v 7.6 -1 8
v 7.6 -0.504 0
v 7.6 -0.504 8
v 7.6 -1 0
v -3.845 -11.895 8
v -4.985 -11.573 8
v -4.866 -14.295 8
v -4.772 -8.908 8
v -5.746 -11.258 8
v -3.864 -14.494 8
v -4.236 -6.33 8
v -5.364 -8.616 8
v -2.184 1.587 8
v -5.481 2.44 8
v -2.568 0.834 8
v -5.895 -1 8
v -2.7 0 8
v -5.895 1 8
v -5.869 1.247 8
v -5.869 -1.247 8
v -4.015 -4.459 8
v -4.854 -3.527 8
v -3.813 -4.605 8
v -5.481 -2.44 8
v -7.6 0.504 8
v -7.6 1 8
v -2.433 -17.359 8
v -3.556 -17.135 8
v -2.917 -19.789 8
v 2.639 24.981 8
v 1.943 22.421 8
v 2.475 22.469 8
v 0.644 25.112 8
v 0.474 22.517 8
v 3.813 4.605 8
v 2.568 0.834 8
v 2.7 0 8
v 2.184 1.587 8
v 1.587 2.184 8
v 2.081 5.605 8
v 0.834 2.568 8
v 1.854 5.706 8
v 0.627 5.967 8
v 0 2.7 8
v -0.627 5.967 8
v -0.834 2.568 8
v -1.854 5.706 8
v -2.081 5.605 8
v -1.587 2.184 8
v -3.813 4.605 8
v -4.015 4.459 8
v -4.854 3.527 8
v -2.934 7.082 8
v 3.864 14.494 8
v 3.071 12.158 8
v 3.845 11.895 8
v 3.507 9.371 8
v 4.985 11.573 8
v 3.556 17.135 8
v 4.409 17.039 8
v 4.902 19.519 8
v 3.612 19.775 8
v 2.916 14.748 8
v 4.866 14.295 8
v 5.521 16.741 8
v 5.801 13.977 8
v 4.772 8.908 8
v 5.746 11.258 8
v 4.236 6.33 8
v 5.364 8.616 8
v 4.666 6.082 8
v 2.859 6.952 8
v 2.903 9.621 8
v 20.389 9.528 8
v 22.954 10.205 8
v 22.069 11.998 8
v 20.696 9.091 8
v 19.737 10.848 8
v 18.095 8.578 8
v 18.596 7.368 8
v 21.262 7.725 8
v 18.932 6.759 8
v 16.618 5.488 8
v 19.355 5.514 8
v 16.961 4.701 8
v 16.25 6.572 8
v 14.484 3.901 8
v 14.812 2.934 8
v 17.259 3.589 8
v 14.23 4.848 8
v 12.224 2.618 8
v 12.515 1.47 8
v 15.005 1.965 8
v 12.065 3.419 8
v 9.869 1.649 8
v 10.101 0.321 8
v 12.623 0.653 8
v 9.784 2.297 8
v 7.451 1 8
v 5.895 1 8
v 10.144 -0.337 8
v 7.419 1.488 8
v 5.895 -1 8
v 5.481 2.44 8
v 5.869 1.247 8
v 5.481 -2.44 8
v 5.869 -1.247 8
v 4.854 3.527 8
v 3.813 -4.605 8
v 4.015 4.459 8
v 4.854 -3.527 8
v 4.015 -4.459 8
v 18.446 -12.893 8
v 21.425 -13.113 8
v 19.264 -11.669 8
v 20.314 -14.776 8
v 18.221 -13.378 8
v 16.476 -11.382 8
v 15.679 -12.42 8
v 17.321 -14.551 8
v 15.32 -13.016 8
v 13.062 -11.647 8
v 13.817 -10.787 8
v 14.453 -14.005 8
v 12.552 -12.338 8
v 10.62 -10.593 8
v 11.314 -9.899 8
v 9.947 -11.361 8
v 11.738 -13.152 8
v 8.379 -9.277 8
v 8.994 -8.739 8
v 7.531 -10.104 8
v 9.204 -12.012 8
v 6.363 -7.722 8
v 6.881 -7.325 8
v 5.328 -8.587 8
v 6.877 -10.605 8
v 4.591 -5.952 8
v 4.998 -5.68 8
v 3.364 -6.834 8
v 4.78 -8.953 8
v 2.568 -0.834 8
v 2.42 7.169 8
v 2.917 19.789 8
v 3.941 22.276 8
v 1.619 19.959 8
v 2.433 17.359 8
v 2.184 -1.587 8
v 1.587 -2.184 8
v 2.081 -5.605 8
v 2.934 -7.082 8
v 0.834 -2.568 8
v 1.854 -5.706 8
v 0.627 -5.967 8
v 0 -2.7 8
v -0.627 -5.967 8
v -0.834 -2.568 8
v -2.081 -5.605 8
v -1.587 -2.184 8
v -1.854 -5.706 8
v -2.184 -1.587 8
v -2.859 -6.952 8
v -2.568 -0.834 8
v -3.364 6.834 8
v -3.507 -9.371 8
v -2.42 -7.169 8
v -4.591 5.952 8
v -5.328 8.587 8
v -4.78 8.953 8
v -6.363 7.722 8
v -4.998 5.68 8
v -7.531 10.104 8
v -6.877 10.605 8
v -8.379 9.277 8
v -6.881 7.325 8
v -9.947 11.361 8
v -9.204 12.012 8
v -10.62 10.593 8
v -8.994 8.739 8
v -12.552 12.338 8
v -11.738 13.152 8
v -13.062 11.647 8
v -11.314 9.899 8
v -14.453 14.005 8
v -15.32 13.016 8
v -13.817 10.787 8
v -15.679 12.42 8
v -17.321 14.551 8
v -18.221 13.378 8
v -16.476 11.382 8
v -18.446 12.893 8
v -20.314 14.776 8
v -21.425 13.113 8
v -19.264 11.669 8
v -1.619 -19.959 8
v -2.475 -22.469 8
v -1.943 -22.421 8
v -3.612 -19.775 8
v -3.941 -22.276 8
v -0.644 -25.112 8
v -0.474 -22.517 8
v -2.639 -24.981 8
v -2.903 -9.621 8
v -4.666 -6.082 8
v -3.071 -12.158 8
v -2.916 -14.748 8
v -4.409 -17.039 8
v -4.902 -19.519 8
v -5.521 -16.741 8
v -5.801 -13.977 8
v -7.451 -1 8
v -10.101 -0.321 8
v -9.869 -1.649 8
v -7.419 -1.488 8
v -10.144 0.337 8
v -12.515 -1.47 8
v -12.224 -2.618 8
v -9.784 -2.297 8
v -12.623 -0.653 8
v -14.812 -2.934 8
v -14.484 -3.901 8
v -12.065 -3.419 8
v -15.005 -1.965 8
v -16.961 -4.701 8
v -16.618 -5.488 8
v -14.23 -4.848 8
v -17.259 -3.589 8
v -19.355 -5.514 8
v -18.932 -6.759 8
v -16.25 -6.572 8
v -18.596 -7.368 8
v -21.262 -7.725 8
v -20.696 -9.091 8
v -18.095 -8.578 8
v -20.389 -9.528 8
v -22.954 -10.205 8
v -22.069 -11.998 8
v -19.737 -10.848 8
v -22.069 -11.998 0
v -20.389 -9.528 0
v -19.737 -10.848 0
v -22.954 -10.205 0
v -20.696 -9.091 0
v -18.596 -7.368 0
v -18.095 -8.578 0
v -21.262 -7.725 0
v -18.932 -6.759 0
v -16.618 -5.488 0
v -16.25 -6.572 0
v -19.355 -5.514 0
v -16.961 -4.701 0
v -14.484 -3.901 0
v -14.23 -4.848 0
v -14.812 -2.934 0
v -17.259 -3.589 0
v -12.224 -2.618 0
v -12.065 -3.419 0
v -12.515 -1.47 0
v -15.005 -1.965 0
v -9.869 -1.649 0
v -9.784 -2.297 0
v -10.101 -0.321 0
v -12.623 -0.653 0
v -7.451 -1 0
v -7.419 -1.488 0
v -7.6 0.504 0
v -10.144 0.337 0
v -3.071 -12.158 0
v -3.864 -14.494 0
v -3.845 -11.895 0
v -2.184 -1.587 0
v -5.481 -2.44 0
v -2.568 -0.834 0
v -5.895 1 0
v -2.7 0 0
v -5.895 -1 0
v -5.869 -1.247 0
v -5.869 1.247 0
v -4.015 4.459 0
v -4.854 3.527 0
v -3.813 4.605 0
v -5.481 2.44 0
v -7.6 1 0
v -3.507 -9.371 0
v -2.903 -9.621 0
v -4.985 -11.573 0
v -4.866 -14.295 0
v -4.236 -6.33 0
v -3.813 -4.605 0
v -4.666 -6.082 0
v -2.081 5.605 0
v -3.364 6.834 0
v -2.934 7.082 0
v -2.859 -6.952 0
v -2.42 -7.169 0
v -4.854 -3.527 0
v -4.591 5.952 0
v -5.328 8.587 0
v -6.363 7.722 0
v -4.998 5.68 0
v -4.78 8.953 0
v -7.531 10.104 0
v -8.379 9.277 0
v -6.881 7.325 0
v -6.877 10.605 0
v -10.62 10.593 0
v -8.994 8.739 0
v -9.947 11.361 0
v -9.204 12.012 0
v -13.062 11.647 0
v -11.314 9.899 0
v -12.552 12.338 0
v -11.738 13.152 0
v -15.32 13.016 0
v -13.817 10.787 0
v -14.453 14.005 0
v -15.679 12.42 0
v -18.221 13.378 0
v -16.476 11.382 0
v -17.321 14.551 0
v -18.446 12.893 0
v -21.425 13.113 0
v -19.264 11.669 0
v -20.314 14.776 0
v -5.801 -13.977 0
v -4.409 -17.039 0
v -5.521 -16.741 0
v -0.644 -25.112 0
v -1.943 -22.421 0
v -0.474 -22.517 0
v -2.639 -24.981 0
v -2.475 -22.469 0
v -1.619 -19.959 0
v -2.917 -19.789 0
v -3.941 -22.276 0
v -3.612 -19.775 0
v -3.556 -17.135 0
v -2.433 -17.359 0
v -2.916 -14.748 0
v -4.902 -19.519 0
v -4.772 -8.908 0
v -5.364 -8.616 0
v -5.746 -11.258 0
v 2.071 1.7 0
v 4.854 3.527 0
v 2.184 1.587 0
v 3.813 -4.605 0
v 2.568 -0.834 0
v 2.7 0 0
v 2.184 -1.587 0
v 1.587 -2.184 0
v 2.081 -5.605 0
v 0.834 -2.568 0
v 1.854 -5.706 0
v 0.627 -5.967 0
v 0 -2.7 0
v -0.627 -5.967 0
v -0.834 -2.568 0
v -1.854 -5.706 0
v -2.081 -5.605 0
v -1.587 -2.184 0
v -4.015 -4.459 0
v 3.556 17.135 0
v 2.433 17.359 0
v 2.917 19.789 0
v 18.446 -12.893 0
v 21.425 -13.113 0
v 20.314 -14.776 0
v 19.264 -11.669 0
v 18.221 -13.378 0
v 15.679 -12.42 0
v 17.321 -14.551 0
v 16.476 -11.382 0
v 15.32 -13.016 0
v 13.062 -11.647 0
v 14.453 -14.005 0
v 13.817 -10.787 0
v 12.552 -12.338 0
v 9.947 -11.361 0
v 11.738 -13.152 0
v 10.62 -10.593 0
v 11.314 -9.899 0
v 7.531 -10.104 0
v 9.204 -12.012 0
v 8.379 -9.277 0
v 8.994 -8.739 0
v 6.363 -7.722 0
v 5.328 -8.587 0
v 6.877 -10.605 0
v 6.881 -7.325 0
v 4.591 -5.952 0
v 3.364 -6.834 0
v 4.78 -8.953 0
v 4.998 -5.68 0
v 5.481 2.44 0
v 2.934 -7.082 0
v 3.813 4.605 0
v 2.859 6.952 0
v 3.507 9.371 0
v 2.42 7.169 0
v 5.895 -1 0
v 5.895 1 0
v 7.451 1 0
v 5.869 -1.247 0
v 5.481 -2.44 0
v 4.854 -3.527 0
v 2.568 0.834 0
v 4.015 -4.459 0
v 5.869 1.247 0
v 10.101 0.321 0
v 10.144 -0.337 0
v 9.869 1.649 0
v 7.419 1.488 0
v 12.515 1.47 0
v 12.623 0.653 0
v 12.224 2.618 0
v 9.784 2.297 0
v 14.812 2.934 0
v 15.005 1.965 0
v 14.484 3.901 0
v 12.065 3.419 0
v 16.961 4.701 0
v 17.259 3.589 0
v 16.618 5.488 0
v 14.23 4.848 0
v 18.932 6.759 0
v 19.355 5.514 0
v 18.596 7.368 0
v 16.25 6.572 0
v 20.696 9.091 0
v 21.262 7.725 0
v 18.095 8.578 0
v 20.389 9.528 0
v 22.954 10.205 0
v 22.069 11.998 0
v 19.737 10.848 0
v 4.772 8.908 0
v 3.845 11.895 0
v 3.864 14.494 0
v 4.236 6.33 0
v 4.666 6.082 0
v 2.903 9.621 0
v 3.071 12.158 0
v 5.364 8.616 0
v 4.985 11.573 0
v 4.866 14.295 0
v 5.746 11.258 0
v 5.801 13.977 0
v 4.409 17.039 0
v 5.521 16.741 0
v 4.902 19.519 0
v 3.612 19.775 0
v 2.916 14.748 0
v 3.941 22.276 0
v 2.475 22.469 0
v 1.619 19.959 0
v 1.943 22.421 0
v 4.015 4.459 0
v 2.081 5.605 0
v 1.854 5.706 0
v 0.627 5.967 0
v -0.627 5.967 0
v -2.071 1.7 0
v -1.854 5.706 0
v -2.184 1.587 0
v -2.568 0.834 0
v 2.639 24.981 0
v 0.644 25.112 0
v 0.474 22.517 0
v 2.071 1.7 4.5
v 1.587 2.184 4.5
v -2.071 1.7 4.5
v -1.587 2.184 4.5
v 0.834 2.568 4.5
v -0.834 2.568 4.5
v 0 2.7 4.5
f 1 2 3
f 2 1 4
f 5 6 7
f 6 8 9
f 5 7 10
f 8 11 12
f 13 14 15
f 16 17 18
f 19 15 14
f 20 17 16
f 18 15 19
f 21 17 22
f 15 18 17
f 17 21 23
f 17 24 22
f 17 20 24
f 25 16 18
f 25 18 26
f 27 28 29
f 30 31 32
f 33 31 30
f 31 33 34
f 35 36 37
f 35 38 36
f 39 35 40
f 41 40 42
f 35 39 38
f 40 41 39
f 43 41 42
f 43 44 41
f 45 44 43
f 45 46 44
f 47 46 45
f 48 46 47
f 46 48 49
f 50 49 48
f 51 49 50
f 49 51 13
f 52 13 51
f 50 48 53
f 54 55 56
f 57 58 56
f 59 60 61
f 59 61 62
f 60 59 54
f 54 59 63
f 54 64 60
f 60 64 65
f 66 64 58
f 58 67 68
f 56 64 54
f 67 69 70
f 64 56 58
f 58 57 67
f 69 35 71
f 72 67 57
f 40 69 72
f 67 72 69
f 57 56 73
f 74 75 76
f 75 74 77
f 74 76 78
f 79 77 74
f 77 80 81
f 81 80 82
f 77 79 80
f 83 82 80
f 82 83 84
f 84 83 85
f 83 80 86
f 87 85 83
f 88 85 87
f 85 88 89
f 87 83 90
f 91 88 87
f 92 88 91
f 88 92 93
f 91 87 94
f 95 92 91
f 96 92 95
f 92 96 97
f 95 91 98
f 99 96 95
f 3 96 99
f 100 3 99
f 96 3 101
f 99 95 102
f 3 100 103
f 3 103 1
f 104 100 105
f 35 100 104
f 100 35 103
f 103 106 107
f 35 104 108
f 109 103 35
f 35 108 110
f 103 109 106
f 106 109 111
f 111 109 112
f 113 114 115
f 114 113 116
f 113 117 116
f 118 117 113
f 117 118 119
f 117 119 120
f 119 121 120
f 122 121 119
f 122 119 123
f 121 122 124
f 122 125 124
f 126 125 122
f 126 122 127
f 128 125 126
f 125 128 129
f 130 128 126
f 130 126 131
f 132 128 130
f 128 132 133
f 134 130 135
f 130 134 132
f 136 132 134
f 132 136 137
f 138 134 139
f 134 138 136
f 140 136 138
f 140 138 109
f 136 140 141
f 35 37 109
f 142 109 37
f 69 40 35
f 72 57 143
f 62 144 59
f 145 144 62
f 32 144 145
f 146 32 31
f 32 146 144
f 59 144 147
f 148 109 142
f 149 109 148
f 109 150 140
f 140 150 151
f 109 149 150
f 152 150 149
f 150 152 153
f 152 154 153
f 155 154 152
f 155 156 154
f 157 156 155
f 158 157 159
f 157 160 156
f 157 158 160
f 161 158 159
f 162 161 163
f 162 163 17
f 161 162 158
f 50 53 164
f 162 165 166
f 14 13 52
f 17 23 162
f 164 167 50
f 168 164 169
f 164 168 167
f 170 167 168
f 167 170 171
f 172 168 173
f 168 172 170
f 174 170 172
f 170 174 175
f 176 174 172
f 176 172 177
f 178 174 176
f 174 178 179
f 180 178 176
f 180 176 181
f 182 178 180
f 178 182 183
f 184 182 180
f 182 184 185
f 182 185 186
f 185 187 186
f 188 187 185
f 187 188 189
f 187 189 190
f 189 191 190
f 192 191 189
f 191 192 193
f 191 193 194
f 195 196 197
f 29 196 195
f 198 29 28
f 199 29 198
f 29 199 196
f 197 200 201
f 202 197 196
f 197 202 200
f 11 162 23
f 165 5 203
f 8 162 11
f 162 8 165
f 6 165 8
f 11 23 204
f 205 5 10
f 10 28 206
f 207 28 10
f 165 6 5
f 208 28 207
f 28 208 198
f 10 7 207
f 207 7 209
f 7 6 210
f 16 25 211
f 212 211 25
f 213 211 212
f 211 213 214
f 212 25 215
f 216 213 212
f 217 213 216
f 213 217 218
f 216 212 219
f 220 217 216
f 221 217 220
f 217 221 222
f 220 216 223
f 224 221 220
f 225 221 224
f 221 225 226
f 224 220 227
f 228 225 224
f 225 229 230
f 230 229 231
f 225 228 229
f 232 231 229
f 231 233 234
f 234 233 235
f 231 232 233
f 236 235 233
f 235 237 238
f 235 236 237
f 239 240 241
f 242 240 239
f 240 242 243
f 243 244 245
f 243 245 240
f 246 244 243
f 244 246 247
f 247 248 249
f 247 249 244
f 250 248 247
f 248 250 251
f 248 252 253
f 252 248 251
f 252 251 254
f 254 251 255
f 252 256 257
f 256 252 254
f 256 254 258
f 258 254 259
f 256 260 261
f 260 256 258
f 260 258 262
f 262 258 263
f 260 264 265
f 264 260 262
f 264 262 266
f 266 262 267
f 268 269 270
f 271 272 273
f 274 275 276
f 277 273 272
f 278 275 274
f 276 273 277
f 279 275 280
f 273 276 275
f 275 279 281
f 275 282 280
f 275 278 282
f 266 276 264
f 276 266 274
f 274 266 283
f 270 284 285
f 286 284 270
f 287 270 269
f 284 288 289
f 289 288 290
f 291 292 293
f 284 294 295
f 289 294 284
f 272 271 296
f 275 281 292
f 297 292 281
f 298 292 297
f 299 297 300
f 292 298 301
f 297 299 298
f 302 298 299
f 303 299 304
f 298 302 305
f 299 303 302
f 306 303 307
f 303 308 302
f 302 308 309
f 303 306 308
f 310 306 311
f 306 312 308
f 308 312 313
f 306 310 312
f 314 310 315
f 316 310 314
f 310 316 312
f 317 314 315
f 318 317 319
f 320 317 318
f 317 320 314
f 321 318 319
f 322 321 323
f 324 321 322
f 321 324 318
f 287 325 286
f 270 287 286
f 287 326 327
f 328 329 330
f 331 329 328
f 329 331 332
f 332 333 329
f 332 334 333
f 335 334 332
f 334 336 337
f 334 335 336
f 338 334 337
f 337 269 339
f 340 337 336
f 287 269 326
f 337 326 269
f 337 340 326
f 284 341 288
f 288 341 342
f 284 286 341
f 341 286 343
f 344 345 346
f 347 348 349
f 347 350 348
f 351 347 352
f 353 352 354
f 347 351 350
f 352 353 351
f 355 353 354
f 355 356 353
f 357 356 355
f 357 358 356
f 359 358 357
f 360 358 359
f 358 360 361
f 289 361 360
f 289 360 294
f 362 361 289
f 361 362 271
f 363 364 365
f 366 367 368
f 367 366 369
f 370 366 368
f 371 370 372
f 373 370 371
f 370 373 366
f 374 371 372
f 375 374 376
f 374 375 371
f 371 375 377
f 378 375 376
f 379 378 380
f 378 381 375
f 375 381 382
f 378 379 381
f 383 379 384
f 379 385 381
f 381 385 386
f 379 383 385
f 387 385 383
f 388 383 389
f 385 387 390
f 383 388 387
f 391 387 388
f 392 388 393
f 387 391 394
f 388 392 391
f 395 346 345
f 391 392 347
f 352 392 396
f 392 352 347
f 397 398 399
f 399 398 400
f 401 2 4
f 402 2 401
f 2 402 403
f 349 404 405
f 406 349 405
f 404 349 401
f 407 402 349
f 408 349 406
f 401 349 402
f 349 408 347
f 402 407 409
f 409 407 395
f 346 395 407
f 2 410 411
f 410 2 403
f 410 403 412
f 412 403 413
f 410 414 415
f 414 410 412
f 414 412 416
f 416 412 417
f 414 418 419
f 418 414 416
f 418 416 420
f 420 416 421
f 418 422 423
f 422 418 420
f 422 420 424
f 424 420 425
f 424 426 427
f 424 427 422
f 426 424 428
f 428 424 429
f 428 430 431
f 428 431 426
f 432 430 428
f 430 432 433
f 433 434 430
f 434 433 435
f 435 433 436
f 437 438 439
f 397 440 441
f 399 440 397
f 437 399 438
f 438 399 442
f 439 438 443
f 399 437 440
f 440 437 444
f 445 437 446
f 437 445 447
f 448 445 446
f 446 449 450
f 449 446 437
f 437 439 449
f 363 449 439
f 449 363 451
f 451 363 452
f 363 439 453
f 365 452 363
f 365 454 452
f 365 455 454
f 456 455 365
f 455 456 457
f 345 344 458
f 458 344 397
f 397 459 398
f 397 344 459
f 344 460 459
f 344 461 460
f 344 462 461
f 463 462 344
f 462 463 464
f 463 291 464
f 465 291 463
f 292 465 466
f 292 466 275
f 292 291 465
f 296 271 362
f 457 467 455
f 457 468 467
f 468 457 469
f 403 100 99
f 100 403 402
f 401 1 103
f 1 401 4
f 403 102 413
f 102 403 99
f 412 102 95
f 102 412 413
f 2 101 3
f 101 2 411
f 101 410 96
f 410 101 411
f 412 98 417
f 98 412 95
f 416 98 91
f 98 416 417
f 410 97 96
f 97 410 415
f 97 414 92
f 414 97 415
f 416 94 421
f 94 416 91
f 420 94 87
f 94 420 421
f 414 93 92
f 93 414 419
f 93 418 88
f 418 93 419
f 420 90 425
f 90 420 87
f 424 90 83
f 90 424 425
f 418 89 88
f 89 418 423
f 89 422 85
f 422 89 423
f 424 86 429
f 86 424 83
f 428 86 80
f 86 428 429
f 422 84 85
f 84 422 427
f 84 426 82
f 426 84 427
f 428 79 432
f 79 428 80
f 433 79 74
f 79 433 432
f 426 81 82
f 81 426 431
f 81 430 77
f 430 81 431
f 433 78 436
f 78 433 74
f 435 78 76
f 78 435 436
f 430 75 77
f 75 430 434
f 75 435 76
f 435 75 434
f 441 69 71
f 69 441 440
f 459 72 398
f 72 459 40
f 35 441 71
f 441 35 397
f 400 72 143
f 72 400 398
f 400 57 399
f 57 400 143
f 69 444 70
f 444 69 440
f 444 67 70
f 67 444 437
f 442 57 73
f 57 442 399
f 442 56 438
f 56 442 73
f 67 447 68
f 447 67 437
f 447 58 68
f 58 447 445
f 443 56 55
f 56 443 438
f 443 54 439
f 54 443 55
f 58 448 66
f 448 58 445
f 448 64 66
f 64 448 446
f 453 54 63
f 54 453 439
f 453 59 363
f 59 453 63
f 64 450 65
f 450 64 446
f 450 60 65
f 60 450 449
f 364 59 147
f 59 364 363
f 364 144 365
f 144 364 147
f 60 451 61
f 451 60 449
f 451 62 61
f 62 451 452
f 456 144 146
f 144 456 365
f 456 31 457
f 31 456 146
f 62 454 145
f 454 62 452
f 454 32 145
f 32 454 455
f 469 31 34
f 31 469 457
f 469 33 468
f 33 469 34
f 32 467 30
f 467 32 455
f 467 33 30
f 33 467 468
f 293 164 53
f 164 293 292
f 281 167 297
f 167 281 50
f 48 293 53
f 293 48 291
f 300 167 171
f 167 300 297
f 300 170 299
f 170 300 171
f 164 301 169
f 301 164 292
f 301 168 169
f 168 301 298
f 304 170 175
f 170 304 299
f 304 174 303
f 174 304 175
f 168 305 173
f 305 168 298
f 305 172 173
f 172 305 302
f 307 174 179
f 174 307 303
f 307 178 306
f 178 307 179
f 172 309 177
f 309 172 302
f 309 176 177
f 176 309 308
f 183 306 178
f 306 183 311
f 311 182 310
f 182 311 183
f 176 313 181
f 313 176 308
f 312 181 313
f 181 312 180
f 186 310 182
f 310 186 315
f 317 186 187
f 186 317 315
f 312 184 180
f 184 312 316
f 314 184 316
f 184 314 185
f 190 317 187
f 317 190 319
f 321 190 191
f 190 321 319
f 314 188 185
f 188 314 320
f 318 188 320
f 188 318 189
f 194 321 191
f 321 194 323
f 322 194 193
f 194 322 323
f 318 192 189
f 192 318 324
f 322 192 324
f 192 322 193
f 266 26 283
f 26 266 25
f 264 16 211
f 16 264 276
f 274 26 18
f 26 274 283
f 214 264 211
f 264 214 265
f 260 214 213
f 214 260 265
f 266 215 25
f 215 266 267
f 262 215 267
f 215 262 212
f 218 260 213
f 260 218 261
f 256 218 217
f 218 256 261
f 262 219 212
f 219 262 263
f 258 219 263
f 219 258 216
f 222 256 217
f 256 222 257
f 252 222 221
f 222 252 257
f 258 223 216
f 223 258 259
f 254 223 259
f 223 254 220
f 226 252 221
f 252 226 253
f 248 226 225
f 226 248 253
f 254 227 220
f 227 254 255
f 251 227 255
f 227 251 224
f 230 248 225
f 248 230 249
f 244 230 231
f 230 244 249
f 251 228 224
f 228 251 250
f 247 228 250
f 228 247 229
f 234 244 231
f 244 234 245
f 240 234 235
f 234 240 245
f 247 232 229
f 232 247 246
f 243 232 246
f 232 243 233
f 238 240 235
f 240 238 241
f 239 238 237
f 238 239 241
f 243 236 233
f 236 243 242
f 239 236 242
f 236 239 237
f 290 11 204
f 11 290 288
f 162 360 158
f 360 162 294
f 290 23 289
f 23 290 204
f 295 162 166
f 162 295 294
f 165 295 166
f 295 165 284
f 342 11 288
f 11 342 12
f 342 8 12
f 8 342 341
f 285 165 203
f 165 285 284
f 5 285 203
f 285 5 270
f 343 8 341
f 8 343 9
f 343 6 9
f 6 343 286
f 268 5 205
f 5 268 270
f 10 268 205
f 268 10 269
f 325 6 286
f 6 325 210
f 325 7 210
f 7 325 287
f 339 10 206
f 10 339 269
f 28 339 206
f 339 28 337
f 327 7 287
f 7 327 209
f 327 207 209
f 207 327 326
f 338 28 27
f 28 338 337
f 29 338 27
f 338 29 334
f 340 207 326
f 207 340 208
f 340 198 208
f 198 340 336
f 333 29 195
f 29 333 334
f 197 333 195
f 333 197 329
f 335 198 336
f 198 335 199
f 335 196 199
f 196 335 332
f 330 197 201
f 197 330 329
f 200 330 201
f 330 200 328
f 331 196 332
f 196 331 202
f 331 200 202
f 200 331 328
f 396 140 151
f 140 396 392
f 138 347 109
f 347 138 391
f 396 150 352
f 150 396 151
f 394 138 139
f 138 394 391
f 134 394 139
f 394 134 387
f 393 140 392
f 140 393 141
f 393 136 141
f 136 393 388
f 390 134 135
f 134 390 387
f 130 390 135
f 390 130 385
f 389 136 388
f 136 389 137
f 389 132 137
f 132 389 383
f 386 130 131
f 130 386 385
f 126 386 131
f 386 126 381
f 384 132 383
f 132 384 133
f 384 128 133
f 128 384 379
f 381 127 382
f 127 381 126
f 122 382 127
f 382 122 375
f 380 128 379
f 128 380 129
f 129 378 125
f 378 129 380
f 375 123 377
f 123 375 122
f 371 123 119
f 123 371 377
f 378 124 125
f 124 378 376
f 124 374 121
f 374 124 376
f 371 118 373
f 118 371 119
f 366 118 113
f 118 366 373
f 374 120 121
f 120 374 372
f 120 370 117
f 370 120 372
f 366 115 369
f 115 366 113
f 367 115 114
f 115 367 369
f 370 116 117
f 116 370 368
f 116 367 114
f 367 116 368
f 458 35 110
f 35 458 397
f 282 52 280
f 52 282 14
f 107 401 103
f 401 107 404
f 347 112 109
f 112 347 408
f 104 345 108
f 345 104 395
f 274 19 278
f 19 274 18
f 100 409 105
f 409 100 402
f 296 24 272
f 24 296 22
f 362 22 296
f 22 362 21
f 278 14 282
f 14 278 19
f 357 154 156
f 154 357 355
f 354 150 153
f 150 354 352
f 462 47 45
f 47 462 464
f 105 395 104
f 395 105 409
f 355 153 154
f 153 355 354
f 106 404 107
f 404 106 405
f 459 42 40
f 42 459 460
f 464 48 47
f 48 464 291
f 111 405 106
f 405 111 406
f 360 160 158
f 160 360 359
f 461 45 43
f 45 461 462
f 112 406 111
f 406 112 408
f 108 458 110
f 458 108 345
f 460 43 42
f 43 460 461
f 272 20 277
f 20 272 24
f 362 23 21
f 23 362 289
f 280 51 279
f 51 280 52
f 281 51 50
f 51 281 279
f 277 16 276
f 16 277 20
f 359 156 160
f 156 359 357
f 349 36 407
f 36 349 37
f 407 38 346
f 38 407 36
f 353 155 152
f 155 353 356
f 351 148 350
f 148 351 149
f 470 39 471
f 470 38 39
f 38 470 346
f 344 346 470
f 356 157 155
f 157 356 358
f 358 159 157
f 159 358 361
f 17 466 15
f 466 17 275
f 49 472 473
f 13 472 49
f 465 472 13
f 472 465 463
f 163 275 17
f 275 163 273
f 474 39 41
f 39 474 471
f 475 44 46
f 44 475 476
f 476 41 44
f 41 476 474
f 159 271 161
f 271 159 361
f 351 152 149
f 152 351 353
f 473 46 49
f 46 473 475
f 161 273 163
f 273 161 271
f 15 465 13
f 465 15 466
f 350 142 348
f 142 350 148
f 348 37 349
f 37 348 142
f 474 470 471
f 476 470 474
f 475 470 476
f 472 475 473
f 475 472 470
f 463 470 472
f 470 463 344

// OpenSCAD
// file: fan.scad
// Steam Engine Fan - Three Piece Design
// Piece 1: Base with U-cradle bearings (prints flat, no supports)
// Piece 2: Axle with pulley only (prints on side, minimal supports)
// Piece 3: Fan disc with D-hole hub (prints flat, no supports)

// === Parameters ===
fan_blades = 6;
fan_radius = 25;
fan_hub_radius = 6;
fan_blade_width = 8;
fan_blade_thickness = 2;
fan_blade_angle = 25;

pulley_radius = 8;
pulley_width = 6;
pulley_groove_depth = 1.5;

axle_radius = 2.5;
axle_length = 65;
d_flat_depth = 1;  // how much to cut for D-shape

base_length = 50;
base_width = 30;
base_height = 3;
base_screw_hole_radius = 1.5;
base_screw_inset = 5;

bearing_height = 35;
bearing_wall = 3;
bearing_width = 8;
clearance = 0.15;  // tight fit for open slot

// === D-shape profiles ===
module d_shaft(length) {
    // Axle with a flat cut on one side
    difference() {
        rotate([0, 90, 0])
            cylinder(h=length, r=axle_radius, center=true, $fn=20);
        // Cut flat
        translate([0, axle_radius - d_flat_depth + axle_radius, 0])
            cube([length + 1, axle_radius * 2, axle_radius * 2], center=true);
    }
}

module d_hole(depth) {
    // Matching D-shaped hole with clearance
    hole_r = axle_radius + 0.2;
    difference() {
        rotate([0, 90, 0])
            cylinder(h=depth + 1, r=hole_r, center=true, $fn=20);
        translate([0, hole_r - d_flat_depth + hole_r, 0])
            cube([depth + 2, hole_r * 2, hole_r * 2], center=true);
    }
}

// === Piece 1: Base with U-Cradle Bearings ===

module base() {
    difference() {
        cube([base_length, base_width, base_height], center=true);
        for (x = [-base_length/2 + base_screw_inset, base_length/2 - base_screw_inset])
            for (y = [-base_width/2 + base_screw_inset, base_width/2 - base_screw_inset])
                translate([x, y, 0])
                    cylinder(h=base_height+1, r=base_screw_hole_radius, center=true, $fn=20);
    }
}

module cradle_bearing() {
    cradle_r_inner = axle_radius + clearance;
    cradle_r_outer = cradle_r_inner + bearing_wall;
    post_width = bearing_width;
    post_depth = cradle_r_outer * 2;
    slot_width = (axle_radius + clearance) * 2;  // width of slot for axle
    slot_depth = bearing_height - 25;  // slot bottom at 25mm above base floor

    // Simple rectangular post with vertical slot from top
    difference() {
        // Solid post
        translate([-post_width/2, -post_depth/2, base_height/2])
            cube([post_width, post_depth, bearing_height - base_height/2]);
        // Vertical slot cut from top
        translate([-post_width/2 - 0.5, -slot_width/2, bearing_height - slot_depth])
            cube([post_width + 1, slot_width, slot_depth + 1]);
    }
}

module piece1_base() {
    translate([0, 0, base_height/2])
        base();
    pulley_bearing_x = -base_length/2 + bearing_width/2 + 2;
    fan_bearing_x = base_length/2 - bearing_width/2 - 2;
    translate([pulley_bearing_x, 0, 0])
        cradle_bearing();
    translate([fan_bearing_x, 0, 0])
        cradle_bearing();
}

// === Piece 2: Axle + Pulley (no fan) ===

module pulley() {
    rotate([0, 90, 0])
        difference() {
            cylinder(h=pulley_width, r=pulley_radius, center=true, $fn=40);
            rotate_extrude($fn=40)
                translate([pulley_radius - pulley_groove_depth/2, 0, 0])
                    circle(r=pulley_groove_depth, $fn=20);
        }
}

module piece2_axle() {
    // Axle with D-flat on fan end
    difference() {
        rotate([0, 90, 0])
            cylinder(h=axle_length, r=axle_radius, center=true, $fn=20);
        // D-flat cut on fan end (last 10mm)
        translate([axle_length/2 - 5, axle_radius, 0])
            cube([10.1, axle_radius * 2, axle_radius * 2], center=true);
    }
    // Pulley near one end
    translate([-axle_length/2 + pulley_width/2 + 2, 0, 0])
        pulley();
    // Retaining collar next to pulley
    translate([-axle_length/2 + pulley_width + 4, 0, 0])
        rotate([0, 90, 0])
            cylinder(h=2, r=axle_radius + 1.5, center=true, $fn=20);
}

// === Piece 3: Fan Disc ===

blade_sweep = 30;  // degrees of curve across blade length

module swept_blade() {
    blade_length = fan_radius - fan_hub_radius + 1;
    steps = 8;
    step_len = blade_length / steps;
    step_angle = blade_sweep / steps;

    for (s = [0:steps-1]) {
        rotate([0, 0, s * step_angle])
            translate([fan_hub_radius - 1 + s * step_len, -fan_blade_thickness/2, 0])
                cube([step_len + 0.1, fan_blade_thickness, fan_blade_width]);
    }
}

module piece3_fan() {
    difference() {
        union() {
            // Hub
            cylinder(h=fan_blade_width, r=fan_hub_radius, $fn=30);
            // Swept blades
            for (i = [0:fan_blades-1]) {
                rotate([0, 0, i * (360/fan_blades)])
                    swept_blade();
            }
        }
        // D-shaped hole through hub (along Z)
        translate([0, 0, -0.5]) {
            hole_r = axle_radius + 0.2;
            difference() {
                cylinder(h=fan_blade_width + 1, r=hole_r, $fn=20);
                translate([0, hole_r - d_flat_depth + hole_r, 0])
                    cube([hole_r * 2 + 1, hole_r * 2, fan_blade_width + 2], center=true);
            }
        }
    }
}

// === Render all pieces for preview ===
piece1_base();

translate([0, 0, bearing_height + 15])
    piece2_axle();

translate([0, 50, fan_radius + 5])
    piece3_fan();
// main file
// Piece 3: Fan disc with D-hole hub
// Prints flat on bed, no supports needed
use <fan.scad>
piece3_fan();
